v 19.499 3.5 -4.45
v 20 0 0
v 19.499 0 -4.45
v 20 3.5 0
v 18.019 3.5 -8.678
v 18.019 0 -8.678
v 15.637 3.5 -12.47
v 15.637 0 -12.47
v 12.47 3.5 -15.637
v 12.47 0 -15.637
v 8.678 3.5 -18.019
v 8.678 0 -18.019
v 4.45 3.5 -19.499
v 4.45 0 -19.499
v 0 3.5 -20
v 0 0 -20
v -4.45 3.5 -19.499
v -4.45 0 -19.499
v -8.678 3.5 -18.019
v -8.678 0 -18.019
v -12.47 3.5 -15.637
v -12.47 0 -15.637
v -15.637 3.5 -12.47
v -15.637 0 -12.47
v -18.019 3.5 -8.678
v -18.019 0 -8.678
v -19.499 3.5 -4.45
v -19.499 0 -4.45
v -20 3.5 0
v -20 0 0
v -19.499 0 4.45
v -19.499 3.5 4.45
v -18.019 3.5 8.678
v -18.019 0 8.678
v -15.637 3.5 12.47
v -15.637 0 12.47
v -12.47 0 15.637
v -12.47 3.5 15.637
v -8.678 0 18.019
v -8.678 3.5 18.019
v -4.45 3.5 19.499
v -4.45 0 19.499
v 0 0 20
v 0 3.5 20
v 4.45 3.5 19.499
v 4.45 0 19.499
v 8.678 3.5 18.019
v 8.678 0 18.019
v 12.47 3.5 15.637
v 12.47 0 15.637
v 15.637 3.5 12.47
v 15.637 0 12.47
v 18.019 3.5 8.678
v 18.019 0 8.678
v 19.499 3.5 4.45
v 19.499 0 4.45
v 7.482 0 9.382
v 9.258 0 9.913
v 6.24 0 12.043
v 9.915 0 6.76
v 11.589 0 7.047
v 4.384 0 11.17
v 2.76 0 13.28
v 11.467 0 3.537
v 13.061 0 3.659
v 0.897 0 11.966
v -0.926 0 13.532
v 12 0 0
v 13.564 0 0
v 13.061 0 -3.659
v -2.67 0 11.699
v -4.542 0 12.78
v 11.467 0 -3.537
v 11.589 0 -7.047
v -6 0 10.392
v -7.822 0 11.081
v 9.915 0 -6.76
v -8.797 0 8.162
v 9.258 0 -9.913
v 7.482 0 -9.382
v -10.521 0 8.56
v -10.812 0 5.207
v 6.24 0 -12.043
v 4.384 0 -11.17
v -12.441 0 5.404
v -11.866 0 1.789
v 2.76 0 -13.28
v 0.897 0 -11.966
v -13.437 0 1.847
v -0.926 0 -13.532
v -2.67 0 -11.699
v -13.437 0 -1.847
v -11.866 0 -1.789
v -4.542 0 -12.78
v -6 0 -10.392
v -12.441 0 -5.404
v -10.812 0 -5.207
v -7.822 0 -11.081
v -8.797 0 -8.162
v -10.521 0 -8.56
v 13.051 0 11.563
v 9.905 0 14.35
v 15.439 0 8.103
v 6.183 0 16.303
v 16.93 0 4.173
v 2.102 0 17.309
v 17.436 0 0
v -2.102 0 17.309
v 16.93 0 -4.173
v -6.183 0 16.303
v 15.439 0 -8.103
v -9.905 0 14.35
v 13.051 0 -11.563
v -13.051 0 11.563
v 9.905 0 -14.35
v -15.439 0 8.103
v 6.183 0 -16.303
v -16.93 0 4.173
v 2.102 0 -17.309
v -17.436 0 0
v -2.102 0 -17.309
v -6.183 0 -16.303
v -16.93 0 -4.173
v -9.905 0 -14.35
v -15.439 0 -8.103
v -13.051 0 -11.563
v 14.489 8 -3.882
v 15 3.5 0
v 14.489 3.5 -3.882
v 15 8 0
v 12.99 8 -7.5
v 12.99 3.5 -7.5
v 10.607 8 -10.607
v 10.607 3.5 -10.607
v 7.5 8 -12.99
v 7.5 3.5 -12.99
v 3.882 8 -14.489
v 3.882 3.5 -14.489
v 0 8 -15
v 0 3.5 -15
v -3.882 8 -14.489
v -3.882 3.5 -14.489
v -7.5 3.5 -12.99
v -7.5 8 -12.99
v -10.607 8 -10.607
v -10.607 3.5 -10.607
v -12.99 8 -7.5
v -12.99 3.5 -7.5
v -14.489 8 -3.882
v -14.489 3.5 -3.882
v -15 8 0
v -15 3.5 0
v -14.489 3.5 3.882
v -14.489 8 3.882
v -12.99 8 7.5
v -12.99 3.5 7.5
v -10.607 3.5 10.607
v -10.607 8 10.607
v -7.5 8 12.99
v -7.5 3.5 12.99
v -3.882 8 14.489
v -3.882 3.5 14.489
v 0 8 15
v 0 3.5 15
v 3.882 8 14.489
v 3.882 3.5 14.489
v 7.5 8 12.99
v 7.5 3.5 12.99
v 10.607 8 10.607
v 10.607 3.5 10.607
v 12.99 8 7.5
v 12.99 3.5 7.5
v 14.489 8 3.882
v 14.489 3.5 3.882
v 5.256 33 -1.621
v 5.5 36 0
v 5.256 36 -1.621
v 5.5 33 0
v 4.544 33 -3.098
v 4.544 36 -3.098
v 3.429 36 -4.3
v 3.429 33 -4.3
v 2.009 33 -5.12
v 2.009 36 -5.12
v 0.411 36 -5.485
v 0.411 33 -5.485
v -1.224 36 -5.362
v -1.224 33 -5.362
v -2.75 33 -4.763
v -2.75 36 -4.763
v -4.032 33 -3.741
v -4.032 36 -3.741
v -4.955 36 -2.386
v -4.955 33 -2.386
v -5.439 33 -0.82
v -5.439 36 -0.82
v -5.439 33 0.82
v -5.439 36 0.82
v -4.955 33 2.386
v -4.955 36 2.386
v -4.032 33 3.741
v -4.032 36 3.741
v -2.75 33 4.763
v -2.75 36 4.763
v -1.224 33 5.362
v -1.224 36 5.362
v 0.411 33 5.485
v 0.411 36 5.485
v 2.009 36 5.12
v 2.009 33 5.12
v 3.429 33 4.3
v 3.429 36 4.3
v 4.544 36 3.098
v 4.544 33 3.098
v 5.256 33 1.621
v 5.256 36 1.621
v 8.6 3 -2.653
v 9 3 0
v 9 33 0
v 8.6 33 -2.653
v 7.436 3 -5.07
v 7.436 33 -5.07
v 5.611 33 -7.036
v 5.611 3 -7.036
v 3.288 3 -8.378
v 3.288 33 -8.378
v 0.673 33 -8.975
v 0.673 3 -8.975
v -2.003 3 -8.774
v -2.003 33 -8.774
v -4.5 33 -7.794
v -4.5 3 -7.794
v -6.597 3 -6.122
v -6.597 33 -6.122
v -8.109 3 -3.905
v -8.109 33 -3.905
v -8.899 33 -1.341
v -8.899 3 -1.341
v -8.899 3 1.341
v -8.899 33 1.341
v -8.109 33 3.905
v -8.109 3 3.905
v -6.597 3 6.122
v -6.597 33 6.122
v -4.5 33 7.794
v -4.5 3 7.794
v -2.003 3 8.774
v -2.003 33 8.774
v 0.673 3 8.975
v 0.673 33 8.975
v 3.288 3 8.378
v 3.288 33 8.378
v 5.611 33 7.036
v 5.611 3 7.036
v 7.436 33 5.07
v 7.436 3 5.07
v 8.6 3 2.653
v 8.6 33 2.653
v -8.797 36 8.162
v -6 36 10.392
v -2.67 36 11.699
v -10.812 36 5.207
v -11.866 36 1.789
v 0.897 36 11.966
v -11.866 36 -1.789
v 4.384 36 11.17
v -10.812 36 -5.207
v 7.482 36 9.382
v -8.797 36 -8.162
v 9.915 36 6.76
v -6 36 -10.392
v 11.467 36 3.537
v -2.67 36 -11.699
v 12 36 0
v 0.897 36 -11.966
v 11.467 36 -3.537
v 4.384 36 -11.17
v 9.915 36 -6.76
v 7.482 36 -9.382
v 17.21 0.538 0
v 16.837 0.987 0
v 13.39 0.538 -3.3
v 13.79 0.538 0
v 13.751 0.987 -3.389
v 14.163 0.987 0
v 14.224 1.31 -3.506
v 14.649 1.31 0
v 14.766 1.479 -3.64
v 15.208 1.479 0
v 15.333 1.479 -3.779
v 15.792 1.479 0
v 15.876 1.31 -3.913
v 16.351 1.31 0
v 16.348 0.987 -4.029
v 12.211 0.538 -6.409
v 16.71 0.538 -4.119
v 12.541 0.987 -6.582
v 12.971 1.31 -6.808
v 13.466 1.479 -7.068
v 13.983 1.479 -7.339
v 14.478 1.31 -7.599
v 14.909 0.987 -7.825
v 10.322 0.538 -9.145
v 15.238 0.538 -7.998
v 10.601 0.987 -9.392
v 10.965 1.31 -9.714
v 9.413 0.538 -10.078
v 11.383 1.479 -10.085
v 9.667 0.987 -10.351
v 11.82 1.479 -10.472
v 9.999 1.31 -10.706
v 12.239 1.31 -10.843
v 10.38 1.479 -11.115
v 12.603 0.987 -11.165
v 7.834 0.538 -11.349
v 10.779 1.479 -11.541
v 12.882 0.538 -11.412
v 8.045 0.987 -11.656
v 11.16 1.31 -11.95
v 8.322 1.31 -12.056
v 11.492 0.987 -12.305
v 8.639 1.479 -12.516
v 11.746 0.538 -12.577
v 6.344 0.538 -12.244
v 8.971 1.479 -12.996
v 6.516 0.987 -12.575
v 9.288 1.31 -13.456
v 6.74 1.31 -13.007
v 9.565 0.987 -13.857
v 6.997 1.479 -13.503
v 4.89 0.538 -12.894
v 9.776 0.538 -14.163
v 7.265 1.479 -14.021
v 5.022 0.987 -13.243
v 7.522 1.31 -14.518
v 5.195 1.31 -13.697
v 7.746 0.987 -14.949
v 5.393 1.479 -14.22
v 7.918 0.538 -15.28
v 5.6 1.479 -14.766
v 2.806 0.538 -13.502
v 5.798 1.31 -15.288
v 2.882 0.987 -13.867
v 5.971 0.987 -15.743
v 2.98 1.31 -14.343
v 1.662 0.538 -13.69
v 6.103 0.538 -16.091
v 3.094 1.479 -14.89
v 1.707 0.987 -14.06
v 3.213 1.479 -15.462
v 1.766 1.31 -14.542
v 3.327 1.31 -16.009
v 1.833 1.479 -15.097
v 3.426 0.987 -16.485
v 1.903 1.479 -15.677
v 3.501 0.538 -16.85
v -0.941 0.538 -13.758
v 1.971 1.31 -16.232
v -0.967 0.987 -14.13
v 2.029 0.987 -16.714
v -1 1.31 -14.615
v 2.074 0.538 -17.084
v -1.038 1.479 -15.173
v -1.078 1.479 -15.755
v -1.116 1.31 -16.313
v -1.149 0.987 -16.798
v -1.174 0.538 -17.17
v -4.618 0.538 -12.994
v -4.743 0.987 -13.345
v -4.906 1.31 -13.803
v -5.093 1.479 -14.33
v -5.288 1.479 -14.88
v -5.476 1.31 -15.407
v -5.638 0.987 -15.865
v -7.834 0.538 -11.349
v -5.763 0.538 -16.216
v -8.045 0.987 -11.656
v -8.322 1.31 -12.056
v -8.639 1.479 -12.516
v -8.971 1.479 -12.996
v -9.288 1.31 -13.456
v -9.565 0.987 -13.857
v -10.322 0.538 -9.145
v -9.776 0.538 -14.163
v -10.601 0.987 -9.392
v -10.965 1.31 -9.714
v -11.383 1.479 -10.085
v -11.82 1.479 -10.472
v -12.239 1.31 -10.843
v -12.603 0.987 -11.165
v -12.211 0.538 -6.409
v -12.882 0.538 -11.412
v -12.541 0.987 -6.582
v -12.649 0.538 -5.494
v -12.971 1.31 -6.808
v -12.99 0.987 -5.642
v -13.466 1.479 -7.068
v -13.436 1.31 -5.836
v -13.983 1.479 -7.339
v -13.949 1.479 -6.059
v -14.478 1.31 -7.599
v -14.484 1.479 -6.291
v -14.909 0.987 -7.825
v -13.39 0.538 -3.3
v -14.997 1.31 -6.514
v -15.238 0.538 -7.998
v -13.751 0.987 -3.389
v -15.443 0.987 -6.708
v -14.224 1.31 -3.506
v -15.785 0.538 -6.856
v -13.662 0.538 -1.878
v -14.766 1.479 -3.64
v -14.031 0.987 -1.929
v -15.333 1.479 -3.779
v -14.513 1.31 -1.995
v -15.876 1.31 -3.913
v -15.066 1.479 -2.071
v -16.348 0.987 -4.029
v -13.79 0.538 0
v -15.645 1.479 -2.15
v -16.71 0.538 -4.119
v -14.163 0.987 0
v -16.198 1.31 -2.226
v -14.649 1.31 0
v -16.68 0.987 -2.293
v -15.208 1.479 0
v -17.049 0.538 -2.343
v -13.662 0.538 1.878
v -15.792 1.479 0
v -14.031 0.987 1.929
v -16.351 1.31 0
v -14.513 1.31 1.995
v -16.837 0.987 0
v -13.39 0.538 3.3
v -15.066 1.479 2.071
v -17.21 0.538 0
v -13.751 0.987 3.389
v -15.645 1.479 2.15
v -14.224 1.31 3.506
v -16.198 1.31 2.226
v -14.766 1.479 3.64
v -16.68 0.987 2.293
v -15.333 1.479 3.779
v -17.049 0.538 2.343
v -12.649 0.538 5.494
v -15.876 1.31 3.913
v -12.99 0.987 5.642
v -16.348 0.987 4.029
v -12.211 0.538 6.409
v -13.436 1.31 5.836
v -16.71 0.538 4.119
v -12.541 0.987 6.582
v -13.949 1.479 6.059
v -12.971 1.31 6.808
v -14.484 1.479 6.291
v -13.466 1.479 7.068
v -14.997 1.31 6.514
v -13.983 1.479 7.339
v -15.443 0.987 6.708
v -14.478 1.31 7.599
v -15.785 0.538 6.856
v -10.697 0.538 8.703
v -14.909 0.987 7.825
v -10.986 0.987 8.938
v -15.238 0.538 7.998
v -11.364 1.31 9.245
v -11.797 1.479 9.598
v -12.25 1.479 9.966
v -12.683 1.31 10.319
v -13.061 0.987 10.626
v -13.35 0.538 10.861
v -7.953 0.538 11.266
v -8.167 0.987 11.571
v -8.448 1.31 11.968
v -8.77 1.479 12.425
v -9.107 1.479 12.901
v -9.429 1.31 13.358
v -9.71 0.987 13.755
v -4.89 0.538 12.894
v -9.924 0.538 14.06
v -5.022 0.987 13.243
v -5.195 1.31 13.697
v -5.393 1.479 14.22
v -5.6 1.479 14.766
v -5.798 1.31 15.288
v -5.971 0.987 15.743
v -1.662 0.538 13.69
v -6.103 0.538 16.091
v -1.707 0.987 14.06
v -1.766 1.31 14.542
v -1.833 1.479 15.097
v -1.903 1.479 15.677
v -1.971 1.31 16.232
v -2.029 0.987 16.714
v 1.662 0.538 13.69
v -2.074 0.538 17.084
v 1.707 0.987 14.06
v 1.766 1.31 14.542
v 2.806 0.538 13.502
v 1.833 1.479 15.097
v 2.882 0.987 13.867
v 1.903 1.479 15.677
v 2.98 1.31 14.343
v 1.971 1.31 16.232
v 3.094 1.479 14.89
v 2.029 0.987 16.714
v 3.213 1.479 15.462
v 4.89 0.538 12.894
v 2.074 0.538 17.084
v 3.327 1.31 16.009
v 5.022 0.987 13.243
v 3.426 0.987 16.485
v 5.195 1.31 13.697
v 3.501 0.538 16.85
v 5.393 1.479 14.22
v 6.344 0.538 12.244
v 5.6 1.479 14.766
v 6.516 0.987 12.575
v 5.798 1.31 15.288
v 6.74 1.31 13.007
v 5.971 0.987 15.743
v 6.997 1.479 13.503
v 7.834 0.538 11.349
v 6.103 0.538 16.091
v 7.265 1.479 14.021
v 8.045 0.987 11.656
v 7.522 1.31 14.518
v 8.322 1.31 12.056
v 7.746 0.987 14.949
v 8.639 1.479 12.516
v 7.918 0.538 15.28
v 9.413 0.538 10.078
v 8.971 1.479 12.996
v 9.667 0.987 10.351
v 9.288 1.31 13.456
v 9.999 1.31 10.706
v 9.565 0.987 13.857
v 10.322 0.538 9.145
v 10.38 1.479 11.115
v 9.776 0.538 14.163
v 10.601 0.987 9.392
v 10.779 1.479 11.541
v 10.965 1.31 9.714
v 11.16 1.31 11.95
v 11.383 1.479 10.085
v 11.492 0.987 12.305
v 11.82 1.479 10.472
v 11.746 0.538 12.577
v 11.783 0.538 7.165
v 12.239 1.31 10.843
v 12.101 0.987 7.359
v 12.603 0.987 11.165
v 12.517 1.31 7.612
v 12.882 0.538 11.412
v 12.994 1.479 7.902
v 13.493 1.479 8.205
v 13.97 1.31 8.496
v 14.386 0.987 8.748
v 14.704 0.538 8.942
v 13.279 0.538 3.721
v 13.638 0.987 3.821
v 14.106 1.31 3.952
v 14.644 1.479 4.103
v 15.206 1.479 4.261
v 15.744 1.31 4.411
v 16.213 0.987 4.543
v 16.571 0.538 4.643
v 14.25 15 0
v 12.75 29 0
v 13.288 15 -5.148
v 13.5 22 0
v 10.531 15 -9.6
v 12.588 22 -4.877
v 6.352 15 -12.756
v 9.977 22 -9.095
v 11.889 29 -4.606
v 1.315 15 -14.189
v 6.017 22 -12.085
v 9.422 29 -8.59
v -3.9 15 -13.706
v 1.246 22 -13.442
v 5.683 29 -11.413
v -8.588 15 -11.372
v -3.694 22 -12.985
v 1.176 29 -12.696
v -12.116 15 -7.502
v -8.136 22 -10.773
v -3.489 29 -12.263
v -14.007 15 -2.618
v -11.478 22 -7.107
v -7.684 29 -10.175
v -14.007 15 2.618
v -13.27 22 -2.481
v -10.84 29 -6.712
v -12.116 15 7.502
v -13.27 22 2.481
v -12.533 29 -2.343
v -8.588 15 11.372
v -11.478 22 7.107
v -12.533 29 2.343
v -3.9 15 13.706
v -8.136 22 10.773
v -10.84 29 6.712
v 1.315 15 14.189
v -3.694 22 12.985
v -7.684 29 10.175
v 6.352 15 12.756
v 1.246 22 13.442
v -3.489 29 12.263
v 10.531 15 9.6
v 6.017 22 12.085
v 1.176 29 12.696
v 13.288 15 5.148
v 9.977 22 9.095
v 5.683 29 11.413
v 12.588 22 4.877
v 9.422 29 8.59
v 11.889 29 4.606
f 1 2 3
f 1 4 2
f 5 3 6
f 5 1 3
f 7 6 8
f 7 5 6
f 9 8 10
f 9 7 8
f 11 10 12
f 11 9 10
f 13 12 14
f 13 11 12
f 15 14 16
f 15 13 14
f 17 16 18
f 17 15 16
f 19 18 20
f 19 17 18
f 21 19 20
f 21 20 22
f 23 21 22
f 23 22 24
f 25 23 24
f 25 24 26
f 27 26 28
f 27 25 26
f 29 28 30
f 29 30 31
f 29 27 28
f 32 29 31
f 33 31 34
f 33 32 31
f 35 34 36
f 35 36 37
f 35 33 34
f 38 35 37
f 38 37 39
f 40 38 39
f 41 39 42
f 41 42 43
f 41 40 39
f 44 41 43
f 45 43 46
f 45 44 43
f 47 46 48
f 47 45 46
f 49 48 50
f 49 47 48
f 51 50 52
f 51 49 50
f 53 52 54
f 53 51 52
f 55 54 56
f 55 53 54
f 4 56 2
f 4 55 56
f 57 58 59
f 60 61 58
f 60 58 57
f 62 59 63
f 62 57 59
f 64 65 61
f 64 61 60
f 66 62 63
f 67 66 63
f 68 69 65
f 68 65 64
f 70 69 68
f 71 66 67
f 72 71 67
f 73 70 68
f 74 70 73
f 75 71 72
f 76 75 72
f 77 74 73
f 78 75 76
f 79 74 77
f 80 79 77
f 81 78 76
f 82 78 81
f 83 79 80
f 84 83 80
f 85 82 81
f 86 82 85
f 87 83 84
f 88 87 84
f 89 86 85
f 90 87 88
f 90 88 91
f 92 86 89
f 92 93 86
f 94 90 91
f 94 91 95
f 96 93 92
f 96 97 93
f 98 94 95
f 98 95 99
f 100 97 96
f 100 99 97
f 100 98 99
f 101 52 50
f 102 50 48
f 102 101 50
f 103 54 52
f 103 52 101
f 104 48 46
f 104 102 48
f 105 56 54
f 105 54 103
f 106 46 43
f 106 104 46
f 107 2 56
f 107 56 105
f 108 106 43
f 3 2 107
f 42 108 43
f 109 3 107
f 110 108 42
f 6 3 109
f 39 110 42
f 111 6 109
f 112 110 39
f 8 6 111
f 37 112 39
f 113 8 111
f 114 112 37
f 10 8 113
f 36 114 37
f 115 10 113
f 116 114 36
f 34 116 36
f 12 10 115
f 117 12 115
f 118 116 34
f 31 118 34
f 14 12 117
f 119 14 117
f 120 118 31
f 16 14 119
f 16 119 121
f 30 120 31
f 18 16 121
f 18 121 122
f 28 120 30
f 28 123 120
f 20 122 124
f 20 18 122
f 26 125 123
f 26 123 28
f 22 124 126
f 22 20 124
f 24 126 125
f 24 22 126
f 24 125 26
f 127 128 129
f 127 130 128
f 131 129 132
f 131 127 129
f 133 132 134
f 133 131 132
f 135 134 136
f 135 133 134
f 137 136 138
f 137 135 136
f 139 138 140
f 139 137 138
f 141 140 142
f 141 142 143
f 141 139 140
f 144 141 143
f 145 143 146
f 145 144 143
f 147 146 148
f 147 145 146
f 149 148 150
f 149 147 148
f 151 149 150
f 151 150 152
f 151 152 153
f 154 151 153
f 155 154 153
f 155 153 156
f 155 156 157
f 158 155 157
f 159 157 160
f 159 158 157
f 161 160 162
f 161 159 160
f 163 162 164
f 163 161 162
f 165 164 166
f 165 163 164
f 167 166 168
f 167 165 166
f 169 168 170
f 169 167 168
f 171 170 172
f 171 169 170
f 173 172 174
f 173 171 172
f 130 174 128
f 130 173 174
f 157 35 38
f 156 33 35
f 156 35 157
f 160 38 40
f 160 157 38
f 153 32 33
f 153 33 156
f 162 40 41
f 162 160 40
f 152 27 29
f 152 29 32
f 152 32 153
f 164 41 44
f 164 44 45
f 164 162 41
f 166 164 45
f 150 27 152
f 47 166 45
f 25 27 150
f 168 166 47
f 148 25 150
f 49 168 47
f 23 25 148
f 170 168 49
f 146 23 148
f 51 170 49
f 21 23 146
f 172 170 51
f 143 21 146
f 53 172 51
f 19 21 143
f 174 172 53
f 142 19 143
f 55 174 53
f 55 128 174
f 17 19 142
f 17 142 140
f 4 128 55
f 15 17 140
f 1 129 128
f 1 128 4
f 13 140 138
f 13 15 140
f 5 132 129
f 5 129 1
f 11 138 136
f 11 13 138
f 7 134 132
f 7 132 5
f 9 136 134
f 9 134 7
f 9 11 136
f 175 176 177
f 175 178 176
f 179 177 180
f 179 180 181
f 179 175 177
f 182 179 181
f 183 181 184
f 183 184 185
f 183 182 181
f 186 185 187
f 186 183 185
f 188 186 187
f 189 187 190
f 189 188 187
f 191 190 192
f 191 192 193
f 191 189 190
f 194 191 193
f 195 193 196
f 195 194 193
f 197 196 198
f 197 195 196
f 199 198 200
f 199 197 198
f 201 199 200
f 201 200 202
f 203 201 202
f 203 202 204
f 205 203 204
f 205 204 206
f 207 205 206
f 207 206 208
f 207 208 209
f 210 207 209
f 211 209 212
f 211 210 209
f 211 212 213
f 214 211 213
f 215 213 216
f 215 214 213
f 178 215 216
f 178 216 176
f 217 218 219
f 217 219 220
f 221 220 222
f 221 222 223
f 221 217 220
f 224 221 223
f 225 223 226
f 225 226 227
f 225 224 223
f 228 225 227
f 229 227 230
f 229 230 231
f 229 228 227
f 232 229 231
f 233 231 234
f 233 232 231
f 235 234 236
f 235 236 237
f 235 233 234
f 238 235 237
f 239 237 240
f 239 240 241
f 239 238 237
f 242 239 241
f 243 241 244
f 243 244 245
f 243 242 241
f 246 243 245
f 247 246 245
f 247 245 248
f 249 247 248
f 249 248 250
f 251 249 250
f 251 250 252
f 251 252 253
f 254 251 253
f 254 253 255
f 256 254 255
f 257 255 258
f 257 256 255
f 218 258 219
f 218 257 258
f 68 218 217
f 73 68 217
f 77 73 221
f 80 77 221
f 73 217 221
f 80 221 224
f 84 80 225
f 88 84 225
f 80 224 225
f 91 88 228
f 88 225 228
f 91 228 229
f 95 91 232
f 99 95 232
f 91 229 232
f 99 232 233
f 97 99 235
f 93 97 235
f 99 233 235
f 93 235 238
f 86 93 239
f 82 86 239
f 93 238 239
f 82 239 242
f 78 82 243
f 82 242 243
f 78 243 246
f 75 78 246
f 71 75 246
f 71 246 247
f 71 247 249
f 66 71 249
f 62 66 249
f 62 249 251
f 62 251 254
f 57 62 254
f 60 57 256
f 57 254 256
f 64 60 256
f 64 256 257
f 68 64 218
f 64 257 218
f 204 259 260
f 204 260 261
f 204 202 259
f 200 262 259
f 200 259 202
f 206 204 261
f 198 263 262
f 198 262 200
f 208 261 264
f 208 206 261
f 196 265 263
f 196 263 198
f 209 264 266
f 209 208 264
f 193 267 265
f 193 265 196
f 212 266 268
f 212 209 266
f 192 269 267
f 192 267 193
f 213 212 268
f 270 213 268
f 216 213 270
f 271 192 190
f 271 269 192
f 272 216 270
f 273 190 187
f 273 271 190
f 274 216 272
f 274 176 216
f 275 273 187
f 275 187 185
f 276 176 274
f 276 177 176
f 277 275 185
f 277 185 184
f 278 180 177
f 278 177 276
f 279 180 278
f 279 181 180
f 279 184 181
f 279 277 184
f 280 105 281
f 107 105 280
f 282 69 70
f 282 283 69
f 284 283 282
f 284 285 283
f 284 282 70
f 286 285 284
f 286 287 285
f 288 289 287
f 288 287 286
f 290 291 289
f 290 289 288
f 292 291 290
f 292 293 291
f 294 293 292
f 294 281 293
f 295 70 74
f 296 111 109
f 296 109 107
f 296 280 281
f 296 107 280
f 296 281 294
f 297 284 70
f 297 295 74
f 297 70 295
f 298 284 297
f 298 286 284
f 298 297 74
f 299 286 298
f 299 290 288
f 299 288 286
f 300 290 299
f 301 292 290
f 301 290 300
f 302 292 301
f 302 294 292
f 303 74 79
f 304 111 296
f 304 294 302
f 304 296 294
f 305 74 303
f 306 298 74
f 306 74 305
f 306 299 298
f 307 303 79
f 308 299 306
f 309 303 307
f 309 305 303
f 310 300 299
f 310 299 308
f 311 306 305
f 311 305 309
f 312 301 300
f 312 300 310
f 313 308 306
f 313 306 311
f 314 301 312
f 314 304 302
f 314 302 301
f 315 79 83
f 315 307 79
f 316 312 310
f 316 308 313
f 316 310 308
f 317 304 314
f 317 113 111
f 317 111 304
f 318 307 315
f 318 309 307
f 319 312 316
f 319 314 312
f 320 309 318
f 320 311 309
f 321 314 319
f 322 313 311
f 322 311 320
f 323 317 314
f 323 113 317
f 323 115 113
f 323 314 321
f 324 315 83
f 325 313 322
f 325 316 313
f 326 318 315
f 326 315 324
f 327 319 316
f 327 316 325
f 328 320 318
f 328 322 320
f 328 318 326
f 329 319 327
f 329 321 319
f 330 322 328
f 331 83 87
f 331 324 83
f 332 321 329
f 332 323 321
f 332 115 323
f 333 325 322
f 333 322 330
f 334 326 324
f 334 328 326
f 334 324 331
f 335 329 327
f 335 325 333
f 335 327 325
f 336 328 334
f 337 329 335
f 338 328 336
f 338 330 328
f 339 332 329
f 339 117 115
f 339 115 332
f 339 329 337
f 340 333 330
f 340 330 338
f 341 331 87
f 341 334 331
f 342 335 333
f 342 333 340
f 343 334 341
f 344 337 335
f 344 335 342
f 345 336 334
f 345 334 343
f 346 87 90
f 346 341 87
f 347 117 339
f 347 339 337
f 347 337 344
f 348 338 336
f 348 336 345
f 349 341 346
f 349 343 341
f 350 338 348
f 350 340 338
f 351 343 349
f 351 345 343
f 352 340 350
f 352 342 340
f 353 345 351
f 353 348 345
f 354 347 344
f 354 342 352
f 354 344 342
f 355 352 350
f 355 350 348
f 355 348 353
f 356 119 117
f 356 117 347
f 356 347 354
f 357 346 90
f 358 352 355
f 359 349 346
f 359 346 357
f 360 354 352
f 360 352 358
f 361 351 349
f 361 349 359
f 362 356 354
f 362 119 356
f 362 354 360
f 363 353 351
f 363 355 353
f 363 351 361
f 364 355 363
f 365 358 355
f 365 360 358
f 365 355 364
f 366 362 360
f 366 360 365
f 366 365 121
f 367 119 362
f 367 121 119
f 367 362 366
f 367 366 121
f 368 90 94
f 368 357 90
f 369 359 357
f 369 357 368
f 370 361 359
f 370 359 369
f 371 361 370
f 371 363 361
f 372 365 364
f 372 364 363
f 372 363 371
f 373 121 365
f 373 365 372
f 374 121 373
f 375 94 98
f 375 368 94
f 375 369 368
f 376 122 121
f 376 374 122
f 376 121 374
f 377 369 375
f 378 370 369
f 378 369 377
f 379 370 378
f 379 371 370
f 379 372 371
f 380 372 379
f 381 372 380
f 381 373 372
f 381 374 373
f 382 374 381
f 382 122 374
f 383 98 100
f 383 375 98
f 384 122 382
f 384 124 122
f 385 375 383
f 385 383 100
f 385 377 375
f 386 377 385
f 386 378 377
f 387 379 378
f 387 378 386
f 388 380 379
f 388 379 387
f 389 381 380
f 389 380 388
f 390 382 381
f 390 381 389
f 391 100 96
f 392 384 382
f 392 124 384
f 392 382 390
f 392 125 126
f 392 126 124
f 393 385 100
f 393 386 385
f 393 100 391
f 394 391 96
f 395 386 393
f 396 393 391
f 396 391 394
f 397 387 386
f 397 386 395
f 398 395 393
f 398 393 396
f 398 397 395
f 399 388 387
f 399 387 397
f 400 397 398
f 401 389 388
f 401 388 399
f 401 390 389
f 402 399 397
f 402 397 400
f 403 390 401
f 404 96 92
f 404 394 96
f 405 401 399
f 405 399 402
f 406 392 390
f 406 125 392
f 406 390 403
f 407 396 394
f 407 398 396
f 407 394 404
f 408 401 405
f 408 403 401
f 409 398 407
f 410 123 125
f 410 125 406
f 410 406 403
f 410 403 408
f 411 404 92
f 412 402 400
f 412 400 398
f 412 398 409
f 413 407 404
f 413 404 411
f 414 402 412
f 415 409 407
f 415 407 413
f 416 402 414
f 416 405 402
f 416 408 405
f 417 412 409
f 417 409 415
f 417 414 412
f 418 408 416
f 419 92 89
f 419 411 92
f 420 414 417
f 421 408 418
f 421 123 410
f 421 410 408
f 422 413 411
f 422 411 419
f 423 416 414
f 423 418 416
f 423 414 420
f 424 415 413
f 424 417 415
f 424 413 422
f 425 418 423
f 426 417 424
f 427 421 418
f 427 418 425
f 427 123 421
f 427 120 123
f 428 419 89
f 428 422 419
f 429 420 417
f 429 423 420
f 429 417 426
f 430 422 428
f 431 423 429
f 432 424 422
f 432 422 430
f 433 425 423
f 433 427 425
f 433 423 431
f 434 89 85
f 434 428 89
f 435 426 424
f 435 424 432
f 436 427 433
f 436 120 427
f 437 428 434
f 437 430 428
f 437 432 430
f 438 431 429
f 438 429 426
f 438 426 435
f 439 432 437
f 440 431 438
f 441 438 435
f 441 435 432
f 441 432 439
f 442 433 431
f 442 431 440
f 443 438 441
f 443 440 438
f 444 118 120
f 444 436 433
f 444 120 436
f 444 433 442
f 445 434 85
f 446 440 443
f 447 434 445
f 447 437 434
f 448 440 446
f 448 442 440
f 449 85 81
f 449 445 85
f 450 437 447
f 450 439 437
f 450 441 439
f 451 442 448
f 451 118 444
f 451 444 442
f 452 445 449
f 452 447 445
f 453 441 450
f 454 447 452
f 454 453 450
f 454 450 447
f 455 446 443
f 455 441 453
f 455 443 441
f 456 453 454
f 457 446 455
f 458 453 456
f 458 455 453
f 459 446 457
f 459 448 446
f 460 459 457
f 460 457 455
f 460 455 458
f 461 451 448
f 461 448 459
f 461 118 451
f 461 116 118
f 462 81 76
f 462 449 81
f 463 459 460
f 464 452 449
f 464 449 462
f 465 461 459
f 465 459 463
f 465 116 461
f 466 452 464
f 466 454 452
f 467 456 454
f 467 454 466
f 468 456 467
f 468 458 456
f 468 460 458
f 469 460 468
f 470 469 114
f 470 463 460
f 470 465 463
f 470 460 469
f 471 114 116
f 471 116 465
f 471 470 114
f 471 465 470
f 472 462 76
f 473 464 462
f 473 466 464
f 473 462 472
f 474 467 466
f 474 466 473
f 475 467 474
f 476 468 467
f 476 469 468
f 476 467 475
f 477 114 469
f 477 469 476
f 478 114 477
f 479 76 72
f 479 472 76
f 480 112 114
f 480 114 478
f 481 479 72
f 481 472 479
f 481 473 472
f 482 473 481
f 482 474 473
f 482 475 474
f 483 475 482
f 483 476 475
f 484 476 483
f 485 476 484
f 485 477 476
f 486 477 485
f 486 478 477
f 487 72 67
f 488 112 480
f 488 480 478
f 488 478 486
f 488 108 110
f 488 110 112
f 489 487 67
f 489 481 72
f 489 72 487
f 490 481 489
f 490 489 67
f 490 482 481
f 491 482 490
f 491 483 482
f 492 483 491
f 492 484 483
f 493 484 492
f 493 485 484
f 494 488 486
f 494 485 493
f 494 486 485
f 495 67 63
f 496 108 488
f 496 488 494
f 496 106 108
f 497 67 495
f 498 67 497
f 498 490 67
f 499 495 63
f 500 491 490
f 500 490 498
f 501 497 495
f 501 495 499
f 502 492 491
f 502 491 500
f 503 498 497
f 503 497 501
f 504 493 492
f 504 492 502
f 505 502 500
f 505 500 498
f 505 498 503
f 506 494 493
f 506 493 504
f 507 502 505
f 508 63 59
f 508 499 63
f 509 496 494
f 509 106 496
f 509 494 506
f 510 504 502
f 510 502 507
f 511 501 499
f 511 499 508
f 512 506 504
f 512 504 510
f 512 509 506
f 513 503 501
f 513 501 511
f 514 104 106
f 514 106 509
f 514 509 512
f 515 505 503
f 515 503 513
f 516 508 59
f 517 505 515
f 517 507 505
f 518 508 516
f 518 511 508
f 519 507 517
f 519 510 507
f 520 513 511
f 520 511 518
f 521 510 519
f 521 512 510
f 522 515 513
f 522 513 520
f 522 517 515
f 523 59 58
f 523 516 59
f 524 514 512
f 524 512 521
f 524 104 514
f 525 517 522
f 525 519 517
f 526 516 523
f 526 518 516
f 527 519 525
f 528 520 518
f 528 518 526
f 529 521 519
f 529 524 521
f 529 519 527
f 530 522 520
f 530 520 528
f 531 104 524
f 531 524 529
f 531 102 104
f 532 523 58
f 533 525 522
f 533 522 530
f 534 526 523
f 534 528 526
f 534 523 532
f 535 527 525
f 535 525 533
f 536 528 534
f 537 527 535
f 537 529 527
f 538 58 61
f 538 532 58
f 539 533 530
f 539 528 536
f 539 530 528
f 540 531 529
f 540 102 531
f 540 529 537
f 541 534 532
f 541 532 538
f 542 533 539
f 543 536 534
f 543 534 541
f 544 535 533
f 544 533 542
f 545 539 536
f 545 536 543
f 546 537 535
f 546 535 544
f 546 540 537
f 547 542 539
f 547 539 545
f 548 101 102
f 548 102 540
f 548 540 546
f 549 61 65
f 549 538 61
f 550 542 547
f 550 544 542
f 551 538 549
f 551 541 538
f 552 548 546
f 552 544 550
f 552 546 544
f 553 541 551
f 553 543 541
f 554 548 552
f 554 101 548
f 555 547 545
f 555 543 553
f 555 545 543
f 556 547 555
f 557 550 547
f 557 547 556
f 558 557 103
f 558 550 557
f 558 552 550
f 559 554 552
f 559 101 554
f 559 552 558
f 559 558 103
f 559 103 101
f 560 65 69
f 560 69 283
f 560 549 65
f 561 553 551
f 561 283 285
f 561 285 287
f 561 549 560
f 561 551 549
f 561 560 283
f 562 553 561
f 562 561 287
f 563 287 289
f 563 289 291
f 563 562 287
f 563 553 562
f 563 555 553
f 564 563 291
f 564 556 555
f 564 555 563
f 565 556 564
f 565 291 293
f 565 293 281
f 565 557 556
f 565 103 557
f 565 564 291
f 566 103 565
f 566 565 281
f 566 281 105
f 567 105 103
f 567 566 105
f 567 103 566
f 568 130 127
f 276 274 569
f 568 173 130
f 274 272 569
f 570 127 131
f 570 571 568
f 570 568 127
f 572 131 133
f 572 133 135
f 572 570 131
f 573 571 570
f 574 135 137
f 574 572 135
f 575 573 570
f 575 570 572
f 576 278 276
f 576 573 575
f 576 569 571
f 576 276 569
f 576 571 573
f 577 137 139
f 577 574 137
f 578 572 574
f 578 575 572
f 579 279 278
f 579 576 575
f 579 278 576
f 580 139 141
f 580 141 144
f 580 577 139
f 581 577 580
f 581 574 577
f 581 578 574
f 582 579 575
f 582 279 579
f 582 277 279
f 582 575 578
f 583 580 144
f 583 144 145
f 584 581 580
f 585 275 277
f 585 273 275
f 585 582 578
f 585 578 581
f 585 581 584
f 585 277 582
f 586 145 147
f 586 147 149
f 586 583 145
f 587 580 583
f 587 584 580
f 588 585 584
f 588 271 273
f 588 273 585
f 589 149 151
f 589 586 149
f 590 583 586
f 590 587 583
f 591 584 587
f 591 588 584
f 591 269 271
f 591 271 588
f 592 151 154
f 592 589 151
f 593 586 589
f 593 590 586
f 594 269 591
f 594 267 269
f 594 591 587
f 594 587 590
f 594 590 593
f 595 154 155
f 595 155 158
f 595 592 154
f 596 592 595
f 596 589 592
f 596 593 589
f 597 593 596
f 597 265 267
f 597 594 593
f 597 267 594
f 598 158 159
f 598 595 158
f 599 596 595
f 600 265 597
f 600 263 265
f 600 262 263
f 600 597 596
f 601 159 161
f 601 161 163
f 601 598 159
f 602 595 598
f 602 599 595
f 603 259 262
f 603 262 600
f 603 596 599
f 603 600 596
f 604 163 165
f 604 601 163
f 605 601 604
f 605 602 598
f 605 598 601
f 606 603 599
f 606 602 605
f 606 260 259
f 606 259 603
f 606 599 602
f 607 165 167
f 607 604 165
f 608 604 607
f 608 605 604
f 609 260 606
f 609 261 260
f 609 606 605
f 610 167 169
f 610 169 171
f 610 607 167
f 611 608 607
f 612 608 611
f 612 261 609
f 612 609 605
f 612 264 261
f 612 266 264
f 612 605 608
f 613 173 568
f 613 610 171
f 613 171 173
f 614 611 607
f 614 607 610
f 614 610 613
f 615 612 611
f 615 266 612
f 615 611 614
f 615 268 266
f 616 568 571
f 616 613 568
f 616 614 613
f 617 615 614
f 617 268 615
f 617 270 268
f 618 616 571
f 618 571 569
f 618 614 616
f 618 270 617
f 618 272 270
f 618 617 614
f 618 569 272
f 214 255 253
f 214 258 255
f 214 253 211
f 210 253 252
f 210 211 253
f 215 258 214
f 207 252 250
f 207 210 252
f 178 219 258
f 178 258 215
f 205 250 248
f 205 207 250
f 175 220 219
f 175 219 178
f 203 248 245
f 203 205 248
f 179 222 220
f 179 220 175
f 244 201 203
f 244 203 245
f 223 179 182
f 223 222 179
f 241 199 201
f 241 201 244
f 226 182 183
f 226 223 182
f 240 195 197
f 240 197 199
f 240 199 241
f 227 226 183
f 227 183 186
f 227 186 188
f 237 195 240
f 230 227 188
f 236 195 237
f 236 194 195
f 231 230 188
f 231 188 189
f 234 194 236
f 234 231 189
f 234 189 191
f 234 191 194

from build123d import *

# Parameters (mm, degrees)
CHAMFER_1_SIZE = 3


with BuildPart() as part:
    # Эскиз1 → Повернуть1 (revolve)
    with BuildSketch(Plane.XY):
        Polygon((9, 0), (20, 0), (20, 3.5), (15, 3.5), (15, 8), (12, 36), (5.5, 36), (5.5, 33), (9, 33), align=None)
    revolve(axis=Axis((0, 0, 0), (0, 1, 0)))

    # Эскиз2 → Вырез-Повернуть1 (revolve, cut)
    with BuildSketch(Plane.XY):
        with BuildLine():
            Line((13.5, -3.5), (13.5, -0.5))
            ThreePointArc((13.5, -0.5), (15.5, 1.5), (17.5, -0.5))
            Line((17.5, -0.5), (17.5, -3.5))
            ThreePointArc((17.5, -3.5), (15.5, -5.5), (13.5, -3.5))
        make_face()
    revolve(axis=Axis((0, 0, 0), (0, 1, 0)), mode=Mode.SUBTRACT)

    # Фаска1
    chamfer_1_edges = [part.edges().sort_by_distance(p)[0] for p in [
        (-9, 0, 0),
    ]]
    chamfer(chamfer_1_edges, length=CHAMFER_1_SIZE)


solid = part.part
